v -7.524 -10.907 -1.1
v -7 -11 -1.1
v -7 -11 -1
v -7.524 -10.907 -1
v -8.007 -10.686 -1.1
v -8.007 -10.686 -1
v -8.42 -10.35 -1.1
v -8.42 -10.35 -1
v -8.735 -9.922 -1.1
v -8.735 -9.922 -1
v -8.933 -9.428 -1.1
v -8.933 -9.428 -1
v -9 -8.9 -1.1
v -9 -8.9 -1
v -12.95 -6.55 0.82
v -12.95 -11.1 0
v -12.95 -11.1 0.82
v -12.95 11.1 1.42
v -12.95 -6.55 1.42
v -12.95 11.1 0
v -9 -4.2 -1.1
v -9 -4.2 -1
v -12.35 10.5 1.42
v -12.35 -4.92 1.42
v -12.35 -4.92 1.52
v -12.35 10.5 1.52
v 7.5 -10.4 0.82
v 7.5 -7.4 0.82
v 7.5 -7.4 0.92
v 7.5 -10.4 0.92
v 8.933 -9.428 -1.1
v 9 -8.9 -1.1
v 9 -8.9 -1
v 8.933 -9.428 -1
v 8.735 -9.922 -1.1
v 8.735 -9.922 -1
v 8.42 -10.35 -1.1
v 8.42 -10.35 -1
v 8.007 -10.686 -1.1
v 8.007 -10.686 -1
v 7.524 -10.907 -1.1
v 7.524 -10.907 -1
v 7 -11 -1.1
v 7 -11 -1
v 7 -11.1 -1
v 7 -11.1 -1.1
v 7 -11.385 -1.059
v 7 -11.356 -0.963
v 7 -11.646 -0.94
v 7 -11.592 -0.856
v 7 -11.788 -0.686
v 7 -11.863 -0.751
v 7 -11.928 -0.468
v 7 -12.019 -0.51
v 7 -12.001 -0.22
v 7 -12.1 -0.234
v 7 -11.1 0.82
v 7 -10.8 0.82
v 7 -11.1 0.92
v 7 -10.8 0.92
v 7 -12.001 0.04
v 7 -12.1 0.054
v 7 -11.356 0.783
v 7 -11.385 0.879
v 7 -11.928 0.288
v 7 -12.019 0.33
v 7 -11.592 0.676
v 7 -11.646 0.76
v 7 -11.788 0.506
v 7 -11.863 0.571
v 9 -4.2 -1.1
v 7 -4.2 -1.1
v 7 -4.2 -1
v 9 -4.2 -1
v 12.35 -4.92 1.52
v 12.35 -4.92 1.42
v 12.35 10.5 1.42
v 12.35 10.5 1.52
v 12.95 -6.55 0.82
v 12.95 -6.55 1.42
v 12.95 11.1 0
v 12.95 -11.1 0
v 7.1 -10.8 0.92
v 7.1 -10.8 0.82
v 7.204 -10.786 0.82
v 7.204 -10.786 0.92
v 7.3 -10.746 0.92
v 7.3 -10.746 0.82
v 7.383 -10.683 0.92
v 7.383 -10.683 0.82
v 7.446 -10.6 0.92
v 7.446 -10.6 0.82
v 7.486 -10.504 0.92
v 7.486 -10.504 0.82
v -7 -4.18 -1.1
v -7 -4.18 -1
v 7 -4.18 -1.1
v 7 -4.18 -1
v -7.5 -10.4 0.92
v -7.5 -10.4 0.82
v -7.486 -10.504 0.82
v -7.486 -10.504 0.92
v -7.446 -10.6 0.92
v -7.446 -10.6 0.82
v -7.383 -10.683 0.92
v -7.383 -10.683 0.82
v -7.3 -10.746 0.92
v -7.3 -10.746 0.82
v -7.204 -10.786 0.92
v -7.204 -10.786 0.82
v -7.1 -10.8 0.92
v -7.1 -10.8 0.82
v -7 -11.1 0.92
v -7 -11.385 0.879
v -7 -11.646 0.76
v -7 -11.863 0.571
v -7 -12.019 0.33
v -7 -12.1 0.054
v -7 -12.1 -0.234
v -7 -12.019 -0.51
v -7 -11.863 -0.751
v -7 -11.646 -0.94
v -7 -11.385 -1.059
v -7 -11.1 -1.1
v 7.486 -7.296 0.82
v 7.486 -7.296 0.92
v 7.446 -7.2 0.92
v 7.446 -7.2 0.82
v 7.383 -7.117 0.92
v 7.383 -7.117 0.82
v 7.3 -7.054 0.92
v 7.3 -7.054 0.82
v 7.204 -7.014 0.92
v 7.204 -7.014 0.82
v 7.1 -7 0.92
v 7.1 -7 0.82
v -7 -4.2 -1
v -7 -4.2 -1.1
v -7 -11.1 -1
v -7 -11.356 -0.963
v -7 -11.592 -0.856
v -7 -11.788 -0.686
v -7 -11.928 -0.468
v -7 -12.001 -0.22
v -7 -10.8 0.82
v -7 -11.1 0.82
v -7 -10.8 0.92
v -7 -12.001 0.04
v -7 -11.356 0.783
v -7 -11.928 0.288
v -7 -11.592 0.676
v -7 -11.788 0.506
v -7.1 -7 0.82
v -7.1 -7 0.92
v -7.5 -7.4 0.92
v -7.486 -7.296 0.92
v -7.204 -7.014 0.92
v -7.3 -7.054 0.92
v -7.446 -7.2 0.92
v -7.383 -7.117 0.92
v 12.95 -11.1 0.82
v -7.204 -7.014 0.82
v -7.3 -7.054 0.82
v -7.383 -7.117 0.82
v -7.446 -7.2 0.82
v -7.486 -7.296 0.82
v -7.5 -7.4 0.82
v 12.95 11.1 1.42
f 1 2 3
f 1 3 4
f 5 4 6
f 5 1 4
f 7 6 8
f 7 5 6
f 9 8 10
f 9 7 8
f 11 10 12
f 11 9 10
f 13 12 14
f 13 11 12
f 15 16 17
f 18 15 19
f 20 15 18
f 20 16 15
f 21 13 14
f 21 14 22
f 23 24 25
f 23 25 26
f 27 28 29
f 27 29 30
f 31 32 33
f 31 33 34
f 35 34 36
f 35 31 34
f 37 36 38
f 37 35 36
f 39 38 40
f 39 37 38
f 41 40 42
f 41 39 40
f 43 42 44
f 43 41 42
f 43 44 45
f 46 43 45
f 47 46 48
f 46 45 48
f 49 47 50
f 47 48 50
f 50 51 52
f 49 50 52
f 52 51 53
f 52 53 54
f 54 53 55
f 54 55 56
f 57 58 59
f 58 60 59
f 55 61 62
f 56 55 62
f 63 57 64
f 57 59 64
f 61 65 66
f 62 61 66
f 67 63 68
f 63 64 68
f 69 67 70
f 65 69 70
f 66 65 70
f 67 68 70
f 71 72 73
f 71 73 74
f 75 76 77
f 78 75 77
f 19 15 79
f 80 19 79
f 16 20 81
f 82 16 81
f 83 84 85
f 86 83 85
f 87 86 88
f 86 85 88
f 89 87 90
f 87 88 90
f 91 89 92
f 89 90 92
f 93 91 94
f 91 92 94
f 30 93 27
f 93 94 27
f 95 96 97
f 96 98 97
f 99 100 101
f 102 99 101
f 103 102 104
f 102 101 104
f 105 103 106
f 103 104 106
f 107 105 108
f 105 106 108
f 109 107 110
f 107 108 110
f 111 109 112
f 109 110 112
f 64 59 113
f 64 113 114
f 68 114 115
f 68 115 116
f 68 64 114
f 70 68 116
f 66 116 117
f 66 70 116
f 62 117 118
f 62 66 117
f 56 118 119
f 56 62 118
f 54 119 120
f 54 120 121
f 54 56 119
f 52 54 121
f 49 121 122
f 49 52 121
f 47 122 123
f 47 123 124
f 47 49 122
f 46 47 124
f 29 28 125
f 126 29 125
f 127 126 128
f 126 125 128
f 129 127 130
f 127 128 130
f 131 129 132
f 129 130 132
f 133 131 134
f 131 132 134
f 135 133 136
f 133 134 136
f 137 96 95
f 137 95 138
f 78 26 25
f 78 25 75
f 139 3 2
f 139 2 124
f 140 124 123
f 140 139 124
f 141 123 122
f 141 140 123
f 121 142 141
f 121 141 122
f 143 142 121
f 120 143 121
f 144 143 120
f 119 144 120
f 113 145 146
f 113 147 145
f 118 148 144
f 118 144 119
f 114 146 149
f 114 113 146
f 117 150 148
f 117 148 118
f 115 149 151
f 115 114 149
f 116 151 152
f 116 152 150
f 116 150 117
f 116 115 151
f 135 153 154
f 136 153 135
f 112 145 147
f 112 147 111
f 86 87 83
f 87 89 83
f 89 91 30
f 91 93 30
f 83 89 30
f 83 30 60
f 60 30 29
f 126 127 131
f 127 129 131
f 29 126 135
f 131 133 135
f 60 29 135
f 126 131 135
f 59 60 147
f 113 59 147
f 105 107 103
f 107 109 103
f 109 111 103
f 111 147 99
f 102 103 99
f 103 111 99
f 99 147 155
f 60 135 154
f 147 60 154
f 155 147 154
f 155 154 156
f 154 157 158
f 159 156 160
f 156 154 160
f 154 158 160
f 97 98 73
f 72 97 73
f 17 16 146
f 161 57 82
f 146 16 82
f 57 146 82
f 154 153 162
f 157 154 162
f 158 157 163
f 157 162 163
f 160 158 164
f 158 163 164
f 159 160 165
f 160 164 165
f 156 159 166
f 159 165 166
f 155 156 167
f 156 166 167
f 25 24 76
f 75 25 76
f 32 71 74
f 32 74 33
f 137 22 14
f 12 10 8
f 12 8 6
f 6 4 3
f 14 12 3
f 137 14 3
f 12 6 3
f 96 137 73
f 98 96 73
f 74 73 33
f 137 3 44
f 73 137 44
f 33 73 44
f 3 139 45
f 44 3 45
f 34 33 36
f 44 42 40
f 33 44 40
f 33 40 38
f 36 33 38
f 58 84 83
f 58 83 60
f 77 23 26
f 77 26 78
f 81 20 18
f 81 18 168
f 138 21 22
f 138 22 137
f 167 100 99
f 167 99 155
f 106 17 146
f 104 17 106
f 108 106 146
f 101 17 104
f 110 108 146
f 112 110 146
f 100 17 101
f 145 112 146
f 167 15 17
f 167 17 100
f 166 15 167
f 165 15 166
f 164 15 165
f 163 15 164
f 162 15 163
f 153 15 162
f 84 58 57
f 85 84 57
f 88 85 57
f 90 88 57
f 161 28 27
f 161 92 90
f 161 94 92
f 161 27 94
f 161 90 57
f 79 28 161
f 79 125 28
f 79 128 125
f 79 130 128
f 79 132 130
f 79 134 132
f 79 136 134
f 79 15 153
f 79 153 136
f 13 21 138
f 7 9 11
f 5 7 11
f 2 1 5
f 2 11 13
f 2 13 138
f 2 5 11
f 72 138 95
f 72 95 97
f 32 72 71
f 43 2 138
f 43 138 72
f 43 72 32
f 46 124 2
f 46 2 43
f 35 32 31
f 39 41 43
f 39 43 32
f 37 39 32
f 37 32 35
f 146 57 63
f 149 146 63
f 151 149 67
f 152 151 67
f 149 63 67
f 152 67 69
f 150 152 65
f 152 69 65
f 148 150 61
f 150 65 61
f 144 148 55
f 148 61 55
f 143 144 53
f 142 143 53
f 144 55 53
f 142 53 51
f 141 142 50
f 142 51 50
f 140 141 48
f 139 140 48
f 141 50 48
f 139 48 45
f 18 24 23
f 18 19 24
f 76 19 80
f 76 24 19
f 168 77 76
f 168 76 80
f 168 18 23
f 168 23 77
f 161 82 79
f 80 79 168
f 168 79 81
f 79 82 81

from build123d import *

# Parameters (mm, degrees)
SKETCH_W     = 25.9
SKETCH_H     = 22.2
PAD_DEPTH    = 0.82
SKETCH001_W  = 25.9
SKETCH001_H  = 17.65
PAD001_DEPTH = 0.6
SKETCH002_W  = 24.7
SKETCH002_H  = 15.42
PAD002_DEPTH = 0.1
PAD003_DEPTH = 0.1
PAD004_DEPTH = 7
PAD005_DEPTH = 0.1


with BuildPart() as part:
    # Sketch → Pad (new body)
    with BuildSketch(Plane.XY):
        Rectangle(SKETCH_W, SKETCH_H)
    extrude(amount=PAD_DEPTH)

    # Sketch001 (on Face6 of Pad) → Pad001 (join)
    with BuildSketch(Plane.XY.offset(0.82)):
        with Locations((0, 2.275)):
            Rectangle(SKETCH001_W, SKETCH001_H)
    extrude(amount=PAD001_DEPTH)

    # Sketch002 (on Face10 of Pad001) → Pad002 (join)
    with BuildSketch(Plane.XY.offset(1.42)):
        with Locations((0, 2.79)):
            Rectangle(SKETCH002_W, SKETCH002_H)
    extrude(amount=PAD002_DEPTH)

    # Sketch003 (on Face7 of Pad002) → Pad003 (join)
    with BuildSketch(Plane.XY.offset(0.82)):
        with BuildLine():
            Line((-7.1, -7), (7.1, -7))
            ThreePointArc((7.5, -7.4), (7.382843, -7.117157), (7.1, -7))
            Line((7.5, -7.4), (7.5, -10.4))
            ThreePointArc((7.1, -10.8), (7.382843, -10.682843), (7.5, -10.4))
            Line((7.1, -10.8), (7, -10.8))
            Line((7, -10.8), (7, -11.1))
            Line((7, -11.1), (-7, -11.1))
            Line((-7, -11.1), (-7, -10.8))
            Line((-7, -10.8), (-7.1, -10.8))
            ThreePointArc((-7.5, -10.4), (-7.382843, -10.682843), (-7.1, -10.8))
            Line((-7.5, -10.4), (-7.5, -7.4))
            ThreePointArc((-7.1, -7), (-7.382843, -7.117157), (-7.5, -7.4))
        make_face()
    extrude(amount=PAD003_DEPTH)

    # Sketch004 → Pad004 (join, symmetric)
    with BuildSketch(Plane.YZ):
        with BuildLine():
            ThreePointArc((-11.1, 0.82), (-12.01, -0.09), (-11.1, -1))
            Line((-11.1, -1), (-4.18, -1))
            Line((-4.18, -1), (-4.18, -1.1))
            Line((-11.1, -1.1), (-4.18, -1.1))
            ThreePointArc((-11.1, 0.92), (-12.11, -0.09), (-11.1, -1.1))
            Line((-11.1, 0.82), (-11.1, 0.92))
        make_face()
    extrude(amount=PAD004_DEPTH, both=True)

    # Sketch005 (on Face34 of Pad004) → Pad005 (join)
    with BuildSketch(Plane(origin=(0, 0, -1.1), x_dir=(1, 0, 0), z_dir=(0, 0, -1))):
        with BuildLine():
            Line((-9, 4.2), (9, 4.2))
            Line((9, 4.2), (9, 8.9))
            ThreePointArc((9, 8.9), (8.42, 10.35), (7, 11))
            Line((7, 11), (-7, 11))
            ThreePointArc((-7, 11), (-8.42, 10.35), (-9, 8.9))
            Line((-9, 8.9), (-9, 4.2))
        make_face()
    extrude(amount=-PAD005_DEPTH)


solid = part.part
